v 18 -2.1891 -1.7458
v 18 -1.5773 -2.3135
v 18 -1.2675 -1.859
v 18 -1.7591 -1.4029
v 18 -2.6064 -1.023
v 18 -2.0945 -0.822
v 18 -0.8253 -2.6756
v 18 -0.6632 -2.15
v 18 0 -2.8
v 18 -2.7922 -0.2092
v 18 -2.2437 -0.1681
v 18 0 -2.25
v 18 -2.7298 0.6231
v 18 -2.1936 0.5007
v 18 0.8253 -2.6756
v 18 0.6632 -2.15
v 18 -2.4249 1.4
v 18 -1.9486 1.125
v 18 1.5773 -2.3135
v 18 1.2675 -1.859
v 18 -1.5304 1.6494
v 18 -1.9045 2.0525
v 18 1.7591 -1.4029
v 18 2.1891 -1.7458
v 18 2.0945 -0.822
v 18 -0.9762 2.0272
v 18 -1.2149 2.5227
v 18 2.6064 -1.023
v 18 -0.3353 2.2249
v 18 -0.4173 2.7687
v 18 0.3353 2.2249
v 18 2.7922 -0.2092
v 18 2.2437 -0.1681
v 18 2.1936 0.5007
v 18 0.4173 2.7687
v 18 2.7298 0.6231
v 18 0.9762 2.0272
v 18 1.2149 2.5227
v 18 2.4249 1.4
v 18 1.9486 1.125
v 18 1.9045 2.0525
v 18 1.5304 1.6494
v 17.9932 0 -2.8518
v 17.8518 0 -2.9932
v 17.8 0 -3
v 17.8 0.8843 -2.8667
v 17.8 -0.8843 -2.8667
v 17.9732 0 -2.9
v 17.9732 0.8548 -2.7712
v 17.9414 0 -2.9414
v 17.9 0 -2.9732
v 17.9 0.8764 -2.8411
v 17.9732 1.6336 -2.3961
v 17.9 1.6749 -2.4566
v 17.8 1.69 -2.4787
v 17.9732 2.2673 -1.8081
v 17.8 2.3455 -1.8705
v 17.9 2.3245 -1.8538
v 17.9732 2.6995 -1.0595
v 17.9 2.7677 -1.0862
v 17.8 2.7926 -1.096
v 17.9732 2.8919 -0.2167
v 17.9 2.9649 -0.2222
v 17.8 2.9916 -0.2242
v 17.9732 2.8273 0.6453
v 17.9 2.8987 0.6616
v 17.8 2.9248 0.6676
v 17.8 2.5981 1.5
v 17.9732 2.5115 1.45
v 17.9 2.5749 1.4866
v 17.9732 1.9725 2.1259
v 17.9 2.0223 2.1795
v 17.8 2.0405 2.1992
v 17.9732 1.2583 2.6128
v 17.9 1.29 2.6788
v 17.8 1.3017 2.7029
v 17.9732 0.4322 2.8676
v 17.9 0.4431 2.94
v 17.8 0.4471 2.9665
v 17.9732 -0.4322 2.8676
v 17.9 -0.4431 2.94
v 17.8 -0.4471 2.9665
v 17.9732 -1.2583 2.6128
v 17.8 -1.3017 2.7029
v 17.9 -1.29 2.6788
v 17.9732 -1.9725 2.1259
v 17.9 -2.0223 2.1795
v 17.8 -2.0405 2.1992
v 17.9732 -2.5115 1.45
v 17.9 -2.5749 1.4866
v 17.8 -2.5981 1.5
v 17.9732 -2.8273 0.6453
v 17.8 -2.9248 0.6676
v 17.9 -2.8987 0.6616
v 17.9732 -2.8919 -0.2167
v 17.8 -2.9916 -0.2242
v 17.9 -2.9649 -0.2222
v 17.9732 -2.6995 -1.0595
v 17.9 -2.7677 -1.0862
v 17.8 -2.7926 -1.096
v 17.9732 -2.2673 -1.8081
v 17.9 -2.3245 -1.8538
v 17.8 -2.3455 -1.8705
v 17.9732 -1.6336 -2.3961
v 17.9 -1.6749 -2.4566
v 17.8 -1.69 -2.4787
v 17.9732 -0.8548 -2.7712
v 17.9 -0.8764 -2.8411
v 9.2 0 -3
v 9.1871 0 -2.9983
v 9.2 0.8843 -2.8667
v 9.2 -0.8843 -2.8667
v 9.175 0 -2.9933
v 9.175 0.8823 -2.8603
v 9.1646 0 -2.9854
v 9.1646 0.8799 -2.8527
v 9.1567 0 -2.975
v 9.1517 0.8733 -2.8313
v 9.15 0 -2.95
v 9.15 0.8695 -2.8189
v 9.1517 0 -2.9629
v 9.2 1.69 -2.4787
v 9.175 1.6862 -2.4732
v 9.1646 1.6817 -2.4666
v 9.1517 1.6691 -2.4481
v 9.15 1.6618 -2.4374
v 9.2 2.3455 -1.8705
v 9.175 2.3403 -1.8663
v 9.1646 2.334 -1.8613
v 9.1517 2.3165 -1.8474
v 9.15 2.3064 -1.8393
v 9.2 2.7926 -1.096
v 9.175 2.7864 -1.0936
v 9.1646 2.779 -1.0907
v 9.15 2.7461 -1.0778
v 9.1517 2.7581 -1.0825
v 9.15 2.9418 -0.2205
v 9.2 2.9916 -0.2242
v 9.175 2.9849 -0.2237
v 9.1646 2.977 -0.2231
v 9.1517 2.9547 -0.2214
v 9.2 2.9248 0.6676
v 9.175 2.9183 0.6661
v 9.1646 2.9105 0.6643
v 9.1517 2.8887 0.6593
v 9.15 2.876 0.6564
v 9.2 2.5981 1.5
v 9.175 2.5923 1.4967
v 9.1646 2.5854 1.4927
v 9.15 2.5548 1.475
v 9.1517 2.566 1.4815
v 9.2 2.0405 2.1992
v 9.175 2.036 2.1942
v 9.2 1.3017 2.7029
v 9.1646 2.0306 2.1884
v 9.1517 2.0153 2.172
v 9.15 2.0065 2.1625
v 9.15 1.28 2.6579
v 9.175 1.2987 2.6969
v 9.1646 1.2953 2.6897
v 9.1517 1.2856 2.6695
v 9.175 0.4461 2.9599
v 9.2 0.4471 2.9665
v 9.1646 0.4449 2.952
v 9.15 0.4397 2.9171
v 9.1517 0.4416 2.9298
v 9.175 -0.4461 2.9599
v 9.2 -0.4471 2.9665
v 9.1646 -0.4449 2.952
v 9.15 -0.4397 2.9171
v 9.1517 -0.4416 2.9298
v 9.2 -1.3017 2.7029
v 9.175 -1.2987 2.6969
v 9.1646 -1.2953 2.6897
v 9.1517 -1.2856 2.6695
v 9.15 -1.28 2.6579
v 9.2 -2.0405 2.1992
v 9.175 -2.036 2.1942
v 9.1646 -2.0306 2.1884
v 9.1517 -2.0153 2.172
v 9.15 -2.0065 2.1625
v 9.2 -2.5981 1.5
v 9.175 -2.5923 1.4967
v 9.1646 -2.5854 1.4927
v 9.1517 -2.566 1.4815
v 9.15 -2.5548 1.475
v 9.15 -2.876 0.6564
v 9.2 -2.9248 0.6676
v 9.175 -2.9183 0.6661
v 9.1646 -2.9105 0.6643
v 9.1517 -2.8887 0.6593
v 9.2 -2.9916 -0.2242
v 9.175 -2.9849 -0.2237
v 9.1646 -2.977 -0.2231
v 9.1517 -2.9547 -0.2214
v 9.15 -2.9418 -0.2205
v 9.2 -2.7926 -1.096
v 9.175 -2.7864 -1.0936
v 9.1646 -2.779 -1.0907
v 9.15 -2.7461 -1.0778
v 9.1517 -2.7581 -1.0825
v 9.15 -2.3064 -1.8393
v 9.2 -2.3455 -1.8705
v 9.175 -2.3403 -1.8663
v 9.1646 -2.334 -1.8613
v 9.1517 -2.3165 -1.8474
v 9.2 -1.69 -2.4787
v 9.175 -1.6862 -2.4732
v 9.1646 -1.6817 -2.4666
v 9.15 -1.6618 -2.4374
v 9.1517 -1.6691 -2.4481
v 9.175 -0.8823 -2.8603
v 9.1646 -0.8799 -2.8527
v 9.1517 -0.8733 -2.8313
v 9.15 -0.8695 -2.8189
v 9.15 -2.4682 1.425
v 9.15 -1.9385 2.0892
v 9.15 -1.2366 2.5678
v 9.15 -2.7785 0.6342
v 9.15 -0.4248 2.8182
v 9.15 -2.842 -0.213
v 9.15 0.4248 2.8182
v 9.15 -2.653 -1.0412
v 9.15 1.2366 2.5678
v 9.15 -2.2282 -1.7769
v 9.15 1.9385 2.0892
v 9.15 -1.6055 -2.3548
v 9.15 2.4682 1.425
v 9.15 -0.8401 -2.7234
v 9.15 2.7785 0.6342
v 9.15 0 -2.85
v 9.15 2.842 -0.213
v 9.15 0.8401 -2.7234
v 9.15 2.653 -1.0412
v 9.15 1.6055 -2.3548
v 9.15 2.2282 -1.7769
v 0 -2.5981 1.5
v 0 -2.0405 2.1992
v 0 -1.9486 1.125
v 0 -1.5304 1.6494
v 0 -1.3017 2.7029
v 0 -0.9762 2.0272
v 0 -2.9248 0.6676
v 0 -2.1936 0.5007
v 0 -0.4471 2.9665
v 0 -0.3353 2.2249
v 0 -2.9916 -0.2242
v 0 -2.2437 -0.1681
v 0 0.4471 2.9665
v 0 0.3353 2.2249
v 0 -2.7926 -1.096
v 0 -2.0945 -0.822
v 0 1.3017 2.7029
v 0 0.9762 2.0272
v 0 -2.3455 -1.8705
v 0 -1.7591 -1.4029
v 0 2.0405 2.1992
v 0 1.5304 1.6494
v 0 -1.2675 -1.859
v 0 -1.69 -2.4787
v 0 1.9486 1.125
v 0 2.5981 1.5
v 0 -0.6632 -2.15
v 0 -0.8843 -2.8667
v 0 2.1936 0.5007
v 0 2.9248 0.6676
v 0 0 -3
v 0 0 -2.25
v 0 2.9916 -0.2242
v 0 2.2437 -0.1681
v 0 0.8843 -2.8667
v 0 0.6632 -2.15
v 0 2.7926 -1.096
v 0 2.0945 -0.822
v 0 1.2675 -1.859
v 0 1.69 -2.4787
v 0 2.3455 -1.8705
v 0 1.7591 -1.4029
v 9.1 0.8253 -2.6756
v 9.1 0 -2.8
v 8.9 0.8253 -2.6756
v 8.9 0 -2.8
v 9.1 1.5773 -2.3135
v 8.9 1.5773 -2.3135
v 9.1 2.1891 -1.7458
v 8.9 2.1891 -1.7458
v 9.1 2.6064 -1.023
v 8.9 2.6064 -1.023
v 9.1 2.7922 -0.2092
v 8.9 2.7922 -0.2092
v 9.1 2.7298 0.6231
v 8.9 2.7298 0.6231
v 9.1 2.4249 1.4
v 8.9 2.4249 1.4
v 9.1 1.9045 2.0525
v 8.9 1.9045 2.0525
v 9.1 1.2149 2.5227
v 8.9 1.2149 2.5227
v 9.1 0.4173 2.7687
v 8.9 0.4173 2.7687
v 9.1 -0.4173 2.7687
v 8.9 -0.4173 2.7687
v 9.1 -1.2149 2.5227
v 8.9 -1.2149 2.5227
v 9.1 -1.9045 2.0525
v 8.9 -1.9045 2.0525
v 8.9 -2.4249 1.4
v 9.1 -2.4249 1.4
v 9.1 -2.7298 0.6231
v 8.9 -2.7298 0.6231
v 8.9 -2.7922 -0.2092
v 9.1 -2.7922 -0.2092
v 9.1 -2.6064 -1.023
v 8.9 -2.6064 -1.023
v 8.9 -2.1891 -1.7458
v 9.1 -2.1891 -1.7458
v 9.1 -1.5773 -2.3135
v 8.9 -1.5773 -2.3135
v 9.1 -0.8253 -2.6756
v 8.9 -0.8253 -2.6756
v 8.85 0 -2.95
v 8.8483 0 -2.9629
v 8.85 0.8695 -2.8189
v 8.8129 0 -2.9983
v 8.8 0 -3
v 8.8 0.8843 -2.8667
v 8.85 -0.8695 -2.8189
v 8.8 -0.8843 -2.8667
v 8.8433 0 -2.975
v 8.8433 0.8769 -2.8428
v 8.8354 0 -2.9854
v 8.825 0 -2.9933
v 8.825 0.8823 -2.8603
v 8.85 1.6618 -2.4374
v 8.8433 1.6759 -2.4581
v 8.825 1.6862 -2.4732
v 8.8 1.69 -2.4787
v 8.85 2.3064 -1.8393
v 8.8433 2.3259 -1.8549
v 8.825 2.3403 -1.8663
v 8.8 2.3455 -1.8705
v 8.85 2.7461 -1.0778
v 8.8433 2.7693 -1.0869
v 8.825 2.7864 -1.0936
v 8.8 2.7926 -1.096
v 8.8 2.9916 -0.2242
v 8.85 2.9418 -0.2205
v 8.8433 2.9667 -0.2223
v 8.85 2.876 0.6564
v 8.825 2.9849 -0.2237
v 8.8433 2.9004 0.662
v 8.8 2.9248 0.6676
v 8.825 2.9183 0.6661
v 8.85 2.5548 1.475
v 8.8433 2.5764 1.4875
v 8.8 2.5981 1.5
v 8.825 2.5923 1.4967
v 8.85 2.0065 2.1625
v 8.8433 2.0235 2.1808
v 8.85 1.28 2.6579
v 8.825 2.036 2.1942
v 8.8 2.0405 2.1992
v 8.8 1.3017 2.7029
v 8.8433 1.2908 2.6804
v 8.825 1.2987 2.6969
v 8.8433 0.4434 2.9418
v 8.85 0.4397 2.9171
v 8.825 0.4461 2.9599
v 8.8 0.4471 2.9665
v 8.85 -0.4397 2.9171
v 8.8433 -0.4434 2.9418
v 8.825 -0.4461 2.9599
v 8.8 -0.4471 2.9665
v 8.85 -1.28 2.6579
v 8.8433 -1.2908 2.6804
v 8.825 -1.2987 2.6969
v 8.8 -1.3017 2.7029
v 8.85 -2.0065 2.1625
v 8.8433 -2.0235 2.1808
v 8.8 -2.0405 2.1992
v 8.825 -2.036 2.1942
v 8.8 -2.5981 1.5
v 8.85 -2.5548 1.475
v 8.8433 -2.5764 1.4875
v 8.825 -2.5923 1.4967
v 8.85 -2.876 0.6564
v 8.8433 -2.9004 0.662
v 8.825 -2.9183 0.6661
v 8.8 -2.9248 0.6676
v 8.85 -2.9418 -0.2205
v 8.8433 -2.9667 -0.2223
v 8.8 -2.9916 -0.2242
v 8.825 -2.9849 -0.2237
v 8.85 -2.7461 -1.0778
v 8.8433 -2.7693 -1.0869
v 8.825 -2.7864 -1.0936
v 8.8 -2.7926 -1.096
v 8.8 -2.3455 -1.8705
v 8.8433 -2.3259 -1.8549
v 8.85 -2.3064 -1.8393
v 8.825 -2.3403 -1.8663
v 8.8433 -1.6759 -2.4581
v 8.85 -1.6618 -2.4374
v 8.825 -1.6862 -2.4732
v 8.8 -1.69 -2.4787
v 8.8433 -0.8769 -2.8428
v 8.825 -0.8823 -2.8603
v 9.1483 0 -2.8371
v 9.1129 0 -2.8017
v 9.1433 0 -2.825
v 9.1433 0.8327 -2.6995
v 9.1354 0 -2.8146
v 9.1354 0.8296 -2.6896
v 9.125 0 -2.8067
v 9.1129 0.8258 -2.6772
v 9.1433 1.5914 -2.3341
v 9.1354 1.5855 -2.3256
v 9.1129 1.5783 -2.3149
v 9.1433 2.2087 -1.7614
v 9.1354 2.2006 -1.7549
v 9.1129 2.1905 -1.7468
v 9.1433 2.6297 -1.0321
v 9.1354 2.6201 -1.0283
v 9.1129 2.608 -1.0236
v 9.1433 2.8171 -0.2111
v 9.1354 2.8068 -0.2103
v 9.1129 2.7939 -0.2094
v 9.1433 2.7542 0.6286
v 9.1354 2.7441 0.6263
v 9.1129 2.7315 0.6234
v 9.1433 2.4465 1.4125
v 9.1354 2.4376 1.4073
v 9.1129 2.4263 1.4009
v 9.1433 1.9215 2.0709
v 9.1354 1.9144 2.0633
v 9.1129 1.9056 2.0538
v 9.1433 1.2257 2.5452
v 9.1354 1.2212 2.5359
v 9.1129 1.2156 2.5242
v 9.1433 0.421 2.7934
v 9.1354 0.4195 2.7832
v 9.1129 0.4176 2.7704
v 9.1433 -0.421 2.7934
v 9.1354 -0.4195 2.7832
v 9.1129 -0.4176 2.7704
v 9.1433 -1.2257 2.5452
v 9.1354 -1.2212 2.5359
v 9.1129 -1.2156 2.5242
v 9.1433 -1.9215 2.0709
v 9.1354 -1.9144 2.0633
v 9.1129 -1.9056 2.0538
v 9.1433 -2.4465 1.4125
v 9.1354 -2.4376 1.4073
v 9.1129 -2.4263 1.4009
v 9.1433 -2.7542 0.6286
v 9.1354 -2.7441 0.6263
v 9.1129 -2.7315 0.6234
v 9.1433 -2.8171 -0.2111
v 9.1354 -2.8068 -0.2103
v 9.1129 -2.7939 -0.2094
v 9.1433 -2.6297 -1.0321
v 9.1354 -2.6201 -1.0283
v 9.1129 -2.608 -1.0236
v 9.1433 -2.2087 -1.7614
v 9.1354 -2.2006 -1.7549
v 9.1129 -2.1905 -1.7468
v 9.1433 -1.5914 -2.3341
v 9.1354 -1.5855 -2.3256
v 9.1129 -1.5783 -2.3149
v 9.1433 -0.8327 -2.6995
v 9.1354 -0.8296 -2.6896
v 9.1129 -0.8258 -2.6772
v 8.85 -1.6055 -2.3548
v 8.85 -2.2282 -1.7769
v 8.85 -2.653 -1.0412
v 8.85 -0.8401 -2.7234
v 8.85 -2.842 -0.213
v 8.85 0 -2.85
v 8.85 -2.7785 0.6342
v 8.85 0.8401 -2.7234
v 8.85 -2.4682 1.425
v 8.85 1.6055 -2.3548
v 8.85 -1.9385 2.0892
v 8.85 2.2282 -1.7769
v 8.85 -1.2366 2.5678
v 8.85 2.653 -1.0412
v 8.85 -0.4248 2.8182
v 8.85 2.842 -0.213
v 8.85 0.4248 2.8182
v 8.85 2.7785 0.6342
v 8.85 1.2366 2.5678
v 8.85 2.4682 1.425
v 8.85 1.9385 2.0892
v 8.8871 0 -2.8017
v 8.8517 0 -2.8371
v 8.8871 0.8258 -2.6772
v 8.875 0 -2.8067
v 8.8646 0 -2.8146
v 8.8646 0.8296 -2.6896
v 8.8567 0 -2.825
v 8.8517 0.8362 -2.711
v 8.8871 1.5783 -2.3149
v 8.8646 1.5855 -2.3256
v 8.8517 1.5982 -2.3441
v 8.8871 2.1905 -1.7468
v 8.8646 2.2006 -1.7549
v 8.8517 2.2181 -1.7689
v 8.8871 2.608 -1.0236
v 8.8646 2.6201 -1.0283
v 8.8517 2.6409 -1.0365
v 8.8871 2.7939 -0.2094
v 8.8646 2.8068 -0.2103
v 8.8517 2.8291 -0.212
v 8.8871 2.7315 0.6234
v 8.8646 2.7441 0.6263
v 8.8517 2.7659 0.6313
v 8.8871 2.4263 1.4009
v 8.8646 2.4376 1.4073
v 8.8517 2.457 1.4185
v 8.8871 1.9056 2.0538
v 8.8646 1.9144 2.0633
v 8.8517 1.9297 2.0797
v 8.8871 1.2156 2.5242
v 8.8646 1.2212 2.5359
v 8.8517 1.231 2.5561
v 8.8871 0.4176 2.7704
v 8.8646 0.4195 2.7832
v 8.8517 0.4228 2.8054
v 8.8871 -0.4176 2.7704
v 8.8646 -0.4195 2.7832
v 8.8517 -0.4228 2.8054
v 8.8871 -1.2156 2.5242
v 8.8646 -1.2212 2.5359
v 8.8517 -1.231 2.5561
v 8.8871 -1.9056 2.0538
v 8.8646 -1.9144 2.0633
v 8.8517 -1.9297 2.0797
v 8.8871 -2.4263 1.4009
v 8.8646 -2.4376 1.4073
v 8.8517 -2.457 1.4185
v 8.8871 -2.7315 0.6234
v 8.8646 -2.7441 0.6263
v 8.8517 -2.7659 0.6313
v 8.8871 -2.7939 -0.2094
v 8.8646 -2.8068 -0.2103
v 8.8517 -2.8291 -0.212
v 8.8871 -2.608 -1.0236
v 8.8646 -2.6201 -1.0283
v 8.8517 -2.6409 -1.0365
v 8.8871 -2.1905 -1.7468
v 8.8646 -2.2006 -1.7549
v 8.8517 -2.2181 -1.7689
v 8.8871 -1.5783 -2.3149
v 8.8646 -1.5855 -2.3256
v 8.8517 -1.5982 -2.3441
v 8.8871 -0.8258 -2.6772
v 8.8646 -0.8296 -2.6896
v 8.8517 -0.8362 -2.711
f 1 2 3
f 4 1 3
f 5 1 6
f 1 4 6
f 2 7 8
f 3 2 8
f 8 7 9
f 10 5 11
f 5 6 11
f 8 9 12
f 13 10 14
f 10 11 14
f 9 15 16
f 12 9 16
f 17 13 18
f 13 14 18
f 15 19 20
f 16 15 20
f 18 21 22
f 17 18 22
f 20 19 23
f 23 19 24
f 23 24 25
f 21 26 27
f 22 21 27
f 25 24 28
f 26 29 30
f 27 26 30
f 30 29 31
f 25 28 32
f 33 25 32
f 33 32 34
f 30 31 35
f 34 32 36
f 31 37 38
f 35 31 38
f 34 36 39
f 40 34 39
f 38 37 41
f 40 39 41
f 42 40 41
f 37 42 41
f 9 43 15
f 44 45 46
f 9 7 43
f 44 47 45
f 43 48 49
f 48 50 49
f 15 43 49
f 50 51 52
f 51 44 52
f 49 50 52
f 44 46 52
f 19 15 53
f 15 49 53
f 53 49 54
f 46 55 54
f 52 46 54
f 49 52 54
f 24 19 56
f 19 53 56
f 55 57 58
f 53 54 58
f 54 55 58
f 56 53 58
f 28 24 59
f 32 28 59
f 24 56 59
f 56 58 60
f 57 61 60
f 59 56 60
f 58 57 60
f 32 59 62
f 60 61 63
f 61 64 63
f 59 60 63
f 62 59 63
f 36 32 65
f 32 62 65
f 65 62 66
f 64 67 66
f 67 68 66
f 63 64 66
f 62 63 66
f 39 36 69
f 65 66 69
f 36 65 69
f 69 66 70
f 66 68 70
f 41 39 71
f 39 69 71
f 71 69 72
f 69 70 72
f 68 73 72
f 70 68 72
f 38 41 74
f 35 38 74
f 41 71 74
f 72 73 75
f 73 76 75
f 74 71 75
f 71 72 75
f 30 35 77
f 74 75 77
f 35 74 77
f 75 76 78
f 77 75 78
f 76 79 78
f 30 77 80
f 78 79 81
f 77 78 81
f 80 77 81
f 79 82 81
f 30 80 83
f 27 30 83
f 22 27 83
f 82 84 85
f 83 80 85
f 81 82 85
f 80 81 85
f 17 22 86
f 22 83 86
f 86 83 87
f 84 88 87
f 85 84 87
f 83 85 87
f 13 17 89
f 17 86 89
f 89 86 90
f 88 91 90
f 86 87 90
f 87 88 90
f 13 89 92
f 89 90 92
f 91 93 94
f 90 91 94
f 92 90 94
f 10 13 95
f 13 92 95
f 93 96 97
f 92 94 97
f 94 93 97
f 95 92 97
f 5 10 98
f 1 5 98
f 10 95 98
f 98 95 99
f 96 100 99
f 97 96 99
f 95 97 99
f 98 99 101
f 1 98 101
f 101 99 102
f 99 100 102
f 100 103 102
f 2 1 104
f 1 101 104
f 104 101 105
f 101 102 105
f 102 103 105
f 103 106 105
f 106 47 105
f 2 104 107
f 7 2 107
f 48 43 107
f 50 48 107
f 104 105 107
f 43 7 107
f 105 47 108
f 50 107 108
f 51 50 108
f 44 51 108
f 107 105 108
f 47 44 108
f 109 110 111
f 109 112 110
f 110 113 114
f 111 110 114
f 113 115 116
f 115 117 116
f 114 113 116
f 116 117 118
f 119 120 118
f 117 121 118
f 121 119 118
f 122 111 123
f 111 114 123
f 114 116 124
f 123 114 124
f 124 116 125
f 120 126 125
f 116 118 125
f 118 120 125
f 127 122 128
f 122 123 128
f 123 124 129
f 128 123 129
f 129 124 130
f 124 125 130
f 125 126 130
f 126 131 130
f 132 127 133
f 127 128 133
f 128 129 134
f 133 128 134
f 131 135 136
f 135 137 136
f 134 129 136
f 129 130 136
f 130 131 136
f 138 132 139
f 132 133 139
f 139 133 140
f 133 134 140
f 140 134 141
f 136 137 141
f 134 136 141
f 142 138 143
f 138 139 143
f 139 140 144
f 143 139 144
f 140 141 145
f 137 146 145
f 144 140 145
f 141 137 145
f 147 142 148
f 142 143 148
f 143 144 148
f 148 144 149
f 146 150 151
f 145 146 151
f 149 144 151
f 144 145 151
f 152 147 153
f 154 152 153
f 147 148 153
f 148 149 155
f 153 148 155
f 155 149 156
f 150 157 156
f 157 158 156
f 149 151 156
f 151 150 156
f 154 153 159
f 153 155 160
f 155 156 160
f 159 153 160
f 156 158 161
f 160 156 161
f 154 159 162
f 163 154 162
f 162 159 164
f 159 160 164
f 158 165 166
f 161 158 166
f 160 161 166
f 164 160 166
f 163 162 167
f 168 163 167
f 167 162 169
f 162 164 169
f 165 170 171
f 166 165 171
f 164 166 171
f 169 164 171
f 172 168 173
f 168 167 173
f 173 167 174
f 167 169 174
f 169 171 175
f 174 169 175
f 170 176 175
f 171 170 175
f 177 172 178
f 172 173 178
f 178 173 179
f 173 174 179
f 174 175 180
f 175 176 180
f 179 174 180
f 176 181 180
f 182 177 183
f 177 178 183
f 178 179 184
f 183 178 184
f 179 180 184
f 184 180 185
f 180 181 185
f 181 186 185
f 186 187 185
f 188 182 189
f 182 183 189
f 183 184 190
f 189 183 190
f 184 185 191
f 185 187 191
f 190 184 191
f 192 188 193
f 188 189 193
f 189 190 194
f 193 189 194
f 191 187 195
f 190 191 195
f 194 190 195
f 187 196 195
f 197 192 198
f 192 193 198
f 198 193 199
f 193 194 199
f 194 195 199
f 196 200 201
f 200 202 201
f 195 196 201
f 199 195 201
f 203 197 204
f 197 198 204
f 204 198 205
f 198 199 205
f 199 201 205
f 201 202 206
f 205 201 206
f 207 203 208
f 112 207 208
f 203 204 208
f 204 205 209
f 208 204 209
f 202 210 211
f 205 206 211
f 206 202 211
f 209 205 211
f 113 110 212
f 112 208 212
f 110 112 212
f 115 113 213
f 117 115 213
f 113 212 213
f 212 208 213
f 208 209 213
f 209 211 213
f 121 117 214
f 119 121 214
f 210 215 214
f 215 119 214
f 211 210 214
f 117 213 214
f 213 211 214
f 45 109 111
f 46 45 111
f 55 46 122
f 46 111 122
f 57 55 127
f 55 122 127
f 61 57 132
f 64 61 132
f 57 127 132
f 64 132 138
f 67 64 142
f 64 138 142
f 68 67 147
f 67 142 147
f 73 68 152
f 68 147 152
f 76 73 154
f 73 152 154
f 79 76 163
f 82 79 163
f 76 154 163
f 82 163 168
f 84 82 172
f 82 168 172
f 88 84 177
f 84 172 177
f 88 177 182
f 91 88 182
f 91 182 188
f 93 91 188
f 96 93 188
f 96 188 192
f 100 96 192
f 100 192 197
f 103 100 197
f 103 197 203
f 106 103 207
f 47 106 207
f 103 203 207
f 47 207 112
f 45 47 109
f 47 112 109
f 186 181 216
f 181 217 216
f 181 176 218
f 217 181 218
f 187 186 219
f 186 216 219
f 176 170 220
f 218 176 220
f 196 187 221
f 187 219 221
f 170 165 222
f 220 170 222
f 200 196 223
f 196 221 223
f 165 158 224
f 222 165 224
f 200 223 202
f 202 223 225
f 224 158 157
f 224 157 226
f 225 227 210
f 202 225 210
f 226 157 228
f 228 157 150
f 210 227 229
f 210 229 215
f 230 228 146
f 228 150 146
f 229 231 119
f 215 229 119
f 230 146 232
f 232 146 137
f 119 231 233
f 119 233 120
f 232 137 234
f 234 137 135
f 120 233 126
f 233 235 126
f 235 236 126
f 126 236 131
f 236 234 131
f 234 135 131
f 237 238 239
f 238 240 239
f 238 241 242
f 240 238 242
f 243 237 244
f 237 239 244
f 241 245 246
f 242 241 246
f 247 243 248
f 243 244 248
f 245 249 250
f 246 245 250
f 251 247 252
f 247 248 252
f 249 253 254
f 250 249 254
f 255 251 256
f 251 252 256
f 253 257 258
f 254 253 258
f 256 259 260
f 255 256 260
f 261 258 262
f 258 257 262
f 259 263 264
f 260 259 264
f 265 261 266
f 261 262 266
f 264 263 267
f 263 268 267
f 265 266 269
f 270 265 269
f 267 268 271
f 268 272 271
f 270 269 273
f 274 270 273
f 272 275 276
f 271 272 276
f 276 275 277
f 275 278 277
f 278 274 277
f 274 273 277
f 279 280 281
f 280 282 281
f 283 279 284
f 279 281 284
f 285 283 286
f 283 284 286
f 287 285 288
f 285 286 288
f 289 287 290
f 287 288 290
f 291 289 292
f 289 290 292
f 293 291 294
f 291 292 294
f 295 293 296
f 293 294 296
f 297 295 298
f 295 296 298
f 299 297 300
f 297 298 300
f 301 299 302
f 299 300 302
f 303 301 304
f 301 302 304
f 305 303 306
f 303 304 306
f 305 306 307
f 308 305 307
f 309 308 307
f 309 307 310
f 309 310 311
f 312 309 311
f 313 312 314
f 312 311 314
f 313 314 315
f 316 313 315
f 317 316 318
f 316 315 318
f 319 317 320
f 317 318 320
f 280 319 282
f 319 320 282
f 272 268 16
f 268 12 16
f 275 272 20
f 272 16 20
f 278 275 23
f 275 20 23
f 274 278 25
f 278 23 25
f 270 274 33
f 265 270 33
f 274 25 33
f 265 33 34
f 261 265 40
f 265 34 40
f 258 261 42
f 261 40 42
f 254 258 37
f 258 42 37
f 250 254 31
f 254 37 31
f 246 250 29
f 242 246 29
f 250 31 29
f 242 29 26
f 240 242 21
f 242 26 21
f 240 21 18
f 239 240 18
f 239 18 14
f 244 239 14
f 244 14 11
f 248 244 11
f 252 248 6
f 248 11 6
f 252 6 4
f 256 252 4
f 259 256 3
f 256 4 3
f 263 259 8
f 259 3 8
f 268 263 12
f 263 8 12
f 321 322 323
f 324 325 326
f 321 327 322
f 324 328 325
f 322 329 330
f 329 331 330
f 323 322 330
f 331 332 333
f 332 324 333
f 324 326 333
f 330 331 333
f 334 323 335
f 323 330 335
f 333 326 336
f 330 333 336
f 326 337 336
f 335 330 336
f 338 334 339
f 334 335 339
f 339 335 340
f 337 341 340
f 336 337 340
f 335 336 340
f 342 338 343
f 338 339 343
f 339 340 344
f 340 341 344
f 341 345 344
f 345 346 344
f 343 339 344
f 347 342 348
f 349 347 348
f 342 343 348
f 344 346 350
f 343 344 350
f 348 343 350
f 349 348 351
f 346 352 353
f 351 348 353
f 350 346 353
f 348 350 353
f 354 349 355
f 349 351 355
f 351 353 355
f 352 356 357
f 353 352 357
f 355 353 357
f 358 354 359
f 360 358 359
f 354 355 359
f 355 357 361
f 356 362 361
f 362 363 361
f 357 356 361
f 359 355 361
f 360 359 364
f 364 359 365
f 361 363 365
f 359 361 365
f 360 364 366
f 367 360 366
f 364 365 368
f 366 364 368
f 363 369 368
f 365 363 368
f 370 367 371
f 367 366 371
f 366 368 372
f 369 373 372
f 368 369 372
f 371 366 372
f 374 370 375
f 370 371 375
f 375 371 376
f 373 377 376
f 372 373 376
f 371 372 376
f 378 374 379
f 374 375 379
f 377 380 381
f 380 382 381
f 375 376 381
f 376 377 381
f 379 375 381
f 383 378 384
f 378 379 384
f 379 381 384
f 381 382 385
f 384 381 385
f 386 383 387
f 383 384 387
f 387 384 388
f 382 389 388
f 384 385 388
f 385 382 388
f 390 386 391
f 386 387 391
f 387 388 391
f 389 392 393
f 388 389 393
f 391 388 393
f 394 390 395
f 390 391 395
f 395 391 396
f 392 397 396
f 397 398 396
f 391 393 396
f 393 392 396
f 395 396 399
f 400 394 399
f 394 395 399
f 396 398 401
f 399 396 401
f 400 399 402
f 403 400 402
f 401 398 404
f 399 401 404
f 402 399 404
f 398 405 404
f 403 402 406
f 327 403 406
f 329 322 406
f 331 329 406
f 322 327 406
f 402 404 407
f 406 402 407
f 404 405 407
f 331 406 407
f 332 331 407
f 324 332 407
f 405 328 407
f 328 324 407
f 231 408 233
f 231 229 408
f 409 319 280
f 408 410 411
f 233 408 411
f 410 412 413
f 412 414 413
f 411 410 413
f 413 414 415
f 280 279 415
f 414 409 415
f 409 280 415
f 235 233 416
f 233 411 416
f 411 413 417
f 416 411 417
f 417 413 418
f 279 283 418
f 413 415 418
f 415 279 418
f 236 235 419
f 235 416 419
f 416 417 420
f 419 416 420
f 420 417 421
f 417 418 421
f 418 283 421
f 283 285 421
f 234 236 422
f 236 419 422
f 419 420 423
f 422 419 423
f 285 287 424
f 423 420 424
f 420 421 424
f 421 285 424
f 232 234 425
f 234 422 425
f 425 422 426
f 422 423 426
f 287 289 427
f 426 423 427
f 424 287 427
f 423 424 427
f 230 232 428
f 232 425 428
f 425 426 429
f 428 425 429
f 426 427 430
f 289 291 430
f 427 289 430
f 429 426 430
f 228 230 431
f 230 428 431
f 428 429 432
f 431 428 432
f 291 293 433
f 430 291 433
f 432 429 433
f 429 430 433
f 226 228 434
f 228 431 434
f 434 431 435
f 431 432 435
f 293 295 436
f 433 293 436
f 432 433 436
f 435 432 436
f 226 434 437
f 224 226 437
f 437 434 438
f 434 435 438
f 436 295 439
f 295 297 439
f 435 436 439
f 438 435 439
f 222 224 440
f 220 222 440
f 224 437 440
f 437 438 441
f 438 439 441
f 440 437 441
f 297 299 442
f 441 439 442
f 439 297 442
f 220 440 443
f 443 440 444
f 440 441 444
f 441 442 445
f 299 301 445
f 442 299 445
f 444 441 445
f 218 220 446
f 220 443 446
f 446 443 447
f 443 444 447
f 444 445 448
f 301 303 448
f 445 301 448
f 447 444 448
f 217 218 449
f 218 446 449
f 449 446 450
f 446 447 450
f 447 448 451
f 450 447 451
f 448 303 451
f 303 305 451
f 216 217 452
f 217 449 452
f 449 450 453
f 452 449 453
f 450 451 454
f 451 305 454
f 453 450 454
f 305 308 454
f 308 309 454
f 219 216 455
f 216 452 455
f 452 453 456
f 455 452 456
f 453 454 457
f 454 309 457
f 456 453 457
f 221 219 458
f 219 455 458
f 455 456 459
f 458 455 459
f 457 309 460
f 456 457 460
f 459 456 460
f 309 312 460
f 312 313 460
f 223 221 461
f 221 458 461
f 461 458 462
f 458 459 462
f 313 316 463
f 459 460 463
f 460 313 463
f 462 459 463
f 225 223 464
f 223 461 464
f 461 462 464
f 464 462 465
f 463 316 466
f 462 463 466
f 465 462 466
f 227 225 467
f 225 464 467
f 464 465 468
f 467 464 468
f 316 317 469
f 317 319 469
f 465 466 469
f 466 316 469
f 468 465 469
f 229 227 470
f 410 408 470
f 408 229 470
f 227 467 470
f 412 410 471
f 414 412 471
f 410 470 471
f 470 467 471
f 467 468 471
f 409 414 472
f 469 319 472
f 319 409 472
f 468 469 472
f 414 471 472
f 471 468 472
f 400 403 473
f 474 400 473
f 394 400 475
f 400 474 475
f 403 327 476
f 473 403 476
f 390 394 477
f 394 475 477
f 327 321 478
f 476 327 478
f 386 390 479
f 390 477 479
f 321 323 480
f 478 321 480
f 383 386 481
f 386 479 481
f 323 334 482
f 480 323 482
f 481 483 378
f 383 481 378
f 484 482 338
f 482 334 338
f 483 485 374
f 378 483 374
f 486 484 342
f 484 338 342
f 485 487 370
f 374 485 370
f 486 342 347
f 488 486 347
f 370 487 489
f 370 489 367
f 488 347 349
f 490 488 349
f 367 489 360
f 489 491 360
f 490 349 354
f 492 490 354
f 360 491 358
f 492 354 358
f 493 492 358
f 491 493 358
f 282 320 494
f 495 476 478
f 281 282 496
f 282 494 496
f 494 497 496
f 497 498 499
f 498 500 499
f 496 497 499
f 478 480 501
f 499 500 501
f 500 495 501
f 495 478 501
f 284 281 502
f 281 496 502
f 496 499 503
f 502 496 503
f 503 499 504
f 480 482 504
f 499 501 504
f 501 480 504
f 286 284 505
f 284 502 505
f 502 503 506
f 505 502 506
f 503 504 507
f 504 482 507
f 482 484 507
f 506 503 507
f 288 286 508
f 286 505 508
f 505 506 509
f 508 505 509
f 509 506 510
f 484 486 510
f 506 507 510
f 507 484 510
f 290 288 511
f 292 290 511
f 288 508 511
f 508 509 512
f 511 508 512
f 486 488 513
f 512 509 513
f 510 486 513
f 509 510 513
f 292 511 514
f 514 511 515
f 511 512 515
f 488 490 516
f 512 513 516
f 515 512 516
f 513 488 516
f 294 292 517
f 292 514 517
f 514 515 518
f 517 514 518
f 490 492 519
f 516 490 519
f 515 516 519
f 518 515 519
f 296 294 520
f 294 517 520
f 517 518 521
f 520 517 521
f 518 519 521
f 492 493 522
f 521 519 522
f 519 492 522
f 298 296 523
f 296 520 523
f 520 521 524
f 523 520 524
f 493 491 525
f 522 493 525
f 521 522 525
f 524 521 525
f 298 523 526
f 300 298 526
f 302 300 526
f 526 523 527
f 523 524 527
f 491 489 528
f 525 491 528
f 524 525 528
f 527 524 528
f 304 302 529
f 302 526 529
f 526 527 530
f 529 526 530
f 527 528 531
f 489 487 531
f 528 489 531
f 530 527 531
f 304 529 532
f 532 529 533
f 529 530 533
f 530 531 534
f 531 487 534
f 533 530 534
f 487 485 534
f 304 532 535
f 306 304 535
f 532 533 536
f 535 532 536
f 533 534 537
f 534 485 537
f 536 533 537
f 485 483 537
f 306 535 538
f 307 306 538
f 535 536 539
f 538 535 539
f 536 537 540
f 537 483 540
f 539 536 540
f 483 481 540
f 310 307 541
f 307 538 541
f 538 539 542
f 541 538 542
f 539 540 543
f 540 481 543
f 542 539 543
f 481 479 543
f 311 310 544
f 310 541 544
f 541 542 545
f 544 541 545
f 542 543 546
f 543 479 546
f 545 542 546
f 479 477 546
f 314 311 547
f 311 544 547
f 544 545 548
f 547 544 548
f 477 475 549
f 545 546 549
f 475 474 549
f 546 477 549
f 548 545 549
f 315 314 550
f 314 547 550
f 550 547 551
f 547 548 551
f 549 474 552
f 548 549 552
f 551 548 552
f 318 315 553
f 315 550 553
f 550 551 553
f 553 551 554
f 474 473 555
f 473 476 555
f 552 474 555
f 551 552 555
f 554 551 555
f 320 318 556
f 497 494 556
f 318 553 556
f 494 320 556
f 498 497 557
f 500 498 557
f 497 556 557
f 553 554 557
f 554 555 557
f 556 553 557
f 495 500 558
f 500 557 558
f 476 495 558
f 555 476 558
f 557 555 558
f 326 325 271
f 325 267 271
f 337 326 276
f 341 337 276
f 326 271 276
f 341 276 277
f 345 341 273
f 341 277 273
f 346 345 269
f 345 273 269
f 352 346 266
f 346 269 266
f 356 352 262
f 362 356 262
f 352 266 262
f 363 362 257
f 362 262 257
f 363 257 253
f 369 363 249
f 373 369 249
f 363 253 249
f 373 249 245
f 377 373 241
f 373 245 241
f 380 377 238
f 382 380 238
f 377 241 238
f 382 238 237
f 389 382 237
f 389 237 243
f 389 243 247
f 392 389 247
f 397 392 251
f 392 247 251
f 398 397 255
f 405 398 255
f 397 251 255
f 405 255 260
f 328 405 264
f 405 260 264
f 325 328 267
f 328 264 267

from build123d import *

# Parameters (mm, degrees)
FILLET2_R = 0.2


with BuildPart() as part:
    # Sketch2 → Revolve1 (revolve)
    with BuildSketch(Plane(origin=(0, 0, 0), x_dir=(1, 0, 0), z_dir=(0, 1, 0))):
        with BuildLine():
            Line((18, 2.25), (18, 3))
            Line((18, 3), (9.2, 3))
            ThreePointArc((9.2, 3), (9.164644661, 2.985355339), (9.15, 2.95))
            Line((9.15, 2.95), (9.15, 2.85))
            ThreePointArc((9.15, 2.85), (9.135355339, 2.814644661), (9.1, 2.8))
            Line((9.1, 2.8), (8.9, 2.8))
            ThreePointArc((8.9, 2.8), (8.864644661, 2.814644661), (8.85, 2.85))
            Line((8.85, 2.85), (8.85, 2.95))
            ThreePointArc((8.85, 2.95), (8.835355339, 2.985355339), (8.8, 3))
            Line((8.8, 3), (0, 3))
            Line((0, 3), (0, 2.25))
            Line((0, 2.25), (18, 2.25))
        make_face()
    revolve(axis=Axis((0, 0, 0), (1, 0, 0)))

    # Fillet2
    fillet2_edges = [part.edges().sort_by_distance(p)[0] for p in [
        (18, 0, 3),
    ]]
    fillet(fillet2_edges, radius=FILLET2_R)


solid = part.part
